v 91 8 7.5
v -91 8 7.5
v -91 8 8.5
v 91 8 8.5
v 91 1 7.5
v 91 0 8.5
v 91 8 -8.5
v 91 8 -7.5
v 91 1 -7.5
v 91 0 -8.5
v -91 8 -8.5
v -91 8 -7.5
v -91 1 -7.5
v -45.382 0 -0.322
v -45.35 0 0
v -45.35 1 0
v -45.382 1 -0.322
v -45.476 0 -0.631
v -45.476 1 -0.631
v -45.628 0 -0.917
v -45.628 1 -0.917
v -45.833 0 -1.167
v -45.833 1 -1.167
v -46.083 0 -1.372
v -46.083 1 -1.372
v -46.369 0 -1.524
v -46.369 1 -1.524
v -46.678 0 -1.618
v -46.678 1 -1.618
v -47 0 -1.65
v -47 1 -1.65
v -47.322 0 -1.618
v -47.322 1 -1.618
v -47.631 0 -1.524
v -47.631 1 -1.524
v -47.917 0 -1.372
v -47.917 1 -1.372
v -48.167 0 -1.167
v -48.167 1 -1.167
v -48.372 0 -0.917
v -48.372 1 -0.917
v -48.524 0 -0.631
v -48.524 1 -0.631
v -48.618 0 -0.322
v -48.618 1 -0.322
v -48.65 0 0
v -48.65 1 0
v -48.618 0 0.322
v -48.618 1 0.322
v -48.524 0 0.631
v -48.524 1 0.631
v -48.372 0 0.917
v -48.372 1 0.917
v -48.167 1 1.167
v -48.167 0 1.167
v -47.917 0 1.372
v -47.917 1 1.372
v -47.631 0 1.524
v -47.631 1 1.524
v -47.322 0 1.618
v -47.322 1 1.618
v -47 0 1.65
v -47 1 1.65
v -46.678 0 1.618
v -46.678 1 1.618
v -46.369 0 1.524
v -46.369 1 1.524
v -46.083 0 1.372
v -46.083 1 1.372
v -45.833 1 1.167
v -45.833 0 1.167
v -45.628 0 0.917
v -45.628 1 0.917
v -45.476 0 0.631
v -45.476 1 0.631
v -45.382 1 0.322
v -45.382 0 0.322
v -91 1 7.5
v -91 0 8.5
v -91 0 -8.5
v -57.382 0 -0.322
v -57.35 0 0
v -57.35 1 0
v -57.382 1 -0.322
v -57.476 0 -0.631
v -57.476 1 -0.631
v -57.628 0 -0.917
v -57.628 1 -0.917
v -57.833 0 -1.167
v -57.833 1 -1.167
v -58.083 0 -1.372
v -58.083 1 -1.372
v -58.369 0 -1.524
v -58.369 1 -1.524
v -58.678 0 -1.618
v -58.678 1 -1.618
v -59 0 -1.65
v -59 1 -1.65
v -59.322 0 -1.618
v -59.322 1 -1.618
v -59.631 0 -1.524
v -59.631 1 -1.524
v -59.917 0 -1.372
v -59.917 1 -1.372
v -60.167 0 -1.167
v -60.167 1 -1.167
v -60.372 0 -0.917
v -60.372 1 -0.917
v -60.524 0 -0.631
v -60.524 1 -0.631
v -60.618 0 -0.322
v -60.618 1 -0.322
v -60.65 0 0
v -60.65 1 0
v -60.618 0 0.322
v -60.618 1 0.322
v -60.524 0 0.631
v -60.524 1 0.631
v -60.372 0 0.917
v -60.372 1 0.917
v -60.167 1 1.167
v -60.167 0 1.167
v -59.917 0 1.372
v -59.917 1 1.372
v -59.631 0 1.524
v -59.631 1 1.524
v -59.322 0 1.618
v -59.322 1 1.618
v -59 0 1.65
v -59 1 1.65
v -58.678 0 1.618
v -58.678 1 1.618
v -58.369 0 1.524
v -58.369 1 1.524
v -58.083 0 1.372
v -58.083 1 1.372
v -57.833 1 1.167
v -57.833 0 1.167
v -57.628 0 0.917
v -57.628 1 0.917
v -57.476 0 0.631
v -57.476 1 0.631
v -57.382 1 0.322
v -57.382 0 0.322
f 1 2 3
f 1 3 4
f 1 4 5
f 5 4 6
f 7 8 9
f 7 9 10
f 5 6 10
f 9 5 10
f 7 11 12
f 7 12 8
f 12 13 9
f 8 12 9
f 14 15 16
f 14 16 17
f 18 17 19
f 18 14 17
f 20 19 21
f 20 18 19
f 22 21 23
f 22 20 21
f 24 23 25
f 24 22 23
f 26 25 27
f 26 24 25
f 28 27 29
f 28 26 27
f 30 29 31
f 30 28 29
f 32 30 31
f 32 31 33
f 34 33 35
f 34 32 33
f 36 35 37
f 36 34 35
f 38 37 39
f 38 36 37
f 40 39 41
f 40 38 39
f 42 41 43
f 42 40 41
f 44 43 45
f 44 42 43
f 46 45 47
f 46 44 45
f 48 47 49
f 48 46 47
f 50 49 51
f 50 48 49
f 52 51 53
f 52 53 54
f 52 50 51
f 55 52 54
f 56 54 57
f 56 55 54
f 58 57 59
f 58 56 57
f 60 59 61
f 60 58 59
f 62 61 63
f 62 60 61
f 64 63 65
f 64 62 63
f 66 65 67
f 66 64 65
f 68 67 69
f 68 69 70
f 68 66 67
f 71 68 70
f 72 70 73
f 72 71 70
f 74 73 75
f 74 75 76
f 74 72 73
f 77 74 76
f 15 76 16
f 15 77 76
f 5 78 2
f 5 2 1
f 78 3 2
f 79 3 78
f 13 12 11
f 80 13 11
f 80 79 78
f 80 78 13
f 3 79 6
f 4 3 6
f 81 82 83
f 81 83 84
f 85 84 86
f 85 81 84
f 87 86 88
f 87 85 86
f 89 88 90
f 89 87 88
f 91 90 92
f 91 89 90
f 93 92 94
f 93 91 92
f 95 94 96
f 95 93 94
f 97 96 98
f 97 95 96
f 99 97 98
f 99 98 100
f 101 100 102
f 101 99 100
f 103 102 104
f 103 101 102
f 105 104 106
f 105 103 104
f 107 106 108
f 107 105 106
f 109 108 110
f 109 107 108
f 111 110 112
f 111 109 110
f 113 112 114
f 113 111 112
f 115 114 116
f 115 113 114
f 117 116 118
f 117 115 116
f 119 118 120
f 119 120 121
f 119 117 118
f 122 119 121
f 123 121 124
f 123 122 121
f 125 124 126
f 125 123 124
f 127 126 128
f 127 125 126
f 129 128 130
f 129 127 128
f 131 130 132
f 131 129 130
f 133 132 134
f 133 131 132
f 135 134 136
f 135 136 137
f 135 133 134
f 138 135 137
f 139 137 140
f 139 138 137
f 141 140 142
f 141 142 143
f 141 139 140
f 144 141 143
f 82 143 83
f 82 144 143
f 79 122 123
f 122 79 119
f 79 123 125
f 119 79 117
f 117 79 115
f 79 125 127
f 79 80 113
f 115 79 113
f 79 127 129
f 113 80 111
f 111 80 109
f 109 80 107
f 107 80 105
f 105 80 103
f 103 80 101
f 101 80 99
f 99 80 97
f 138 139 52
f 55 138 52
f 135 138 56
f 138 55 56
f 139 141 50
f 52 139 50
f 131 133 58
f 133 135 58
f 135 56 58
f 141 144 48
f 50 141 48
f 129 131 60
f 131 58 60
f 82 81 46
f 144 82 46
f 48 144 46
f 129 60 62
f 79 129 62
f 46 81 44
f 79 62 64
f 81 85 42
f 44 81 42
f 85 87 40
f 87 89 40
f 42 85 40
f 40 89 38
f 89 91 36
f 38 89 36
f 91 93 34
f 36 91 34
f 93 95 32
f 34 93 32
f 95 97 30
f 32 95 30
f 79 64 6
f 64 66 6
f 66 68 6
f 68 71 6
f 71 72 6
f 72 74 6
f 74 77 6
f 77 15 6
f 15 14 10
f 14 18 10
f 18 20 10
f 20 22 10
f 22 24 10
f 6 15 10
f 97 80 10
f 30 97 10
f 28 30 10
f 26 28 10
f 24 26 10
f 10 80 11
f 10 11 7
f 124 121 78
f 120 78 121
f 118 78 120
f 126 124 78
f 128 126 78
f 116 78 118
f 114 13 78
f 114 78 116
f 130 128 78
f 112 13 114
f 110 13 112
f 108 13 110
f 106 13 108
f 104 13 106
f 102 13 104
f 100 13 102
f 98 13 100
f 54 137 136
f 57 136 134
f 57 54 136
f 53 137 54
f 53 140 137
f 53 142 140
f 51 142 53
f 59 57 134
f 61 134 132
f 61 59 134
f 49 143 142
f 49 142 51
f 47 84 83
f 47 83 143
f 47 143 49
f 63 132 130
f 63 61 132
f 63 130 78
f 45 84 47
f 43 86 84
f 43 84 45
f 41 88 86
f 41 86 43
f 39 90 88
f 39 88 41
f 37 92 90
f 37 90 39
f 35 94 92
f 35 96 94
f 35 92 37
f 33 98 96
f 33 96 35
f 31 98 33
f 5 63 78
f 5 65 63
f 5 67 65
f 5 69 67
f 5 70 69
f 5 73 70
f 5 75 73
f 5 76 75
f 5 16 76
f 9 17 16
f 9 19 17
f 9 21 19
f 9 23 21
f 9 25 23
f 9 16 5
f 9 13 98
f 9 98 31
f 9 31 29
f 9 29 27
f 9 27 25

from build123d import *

# Parameters (mm, degrees)
SKETCH1_W               = 182
SKETCH1_H               = 17
BOSS_EXTRUDE1_DEPTH     = 1
SKETCH8_W               = 182
SKETCH8_H               = 1
BOSS_EXTRUDE2_DEPTH     = 7
ADVANCEDHOLE1_OUTLINE_R = 1.65
ADVANCEDHOLE1_DEPTH     = 1
SKETCH12_W              = 182
SKETCH12_H              = 13
SKETCH12_R              = 2
BOSS_EXTRUDE3_DEPTH     = 1
SKETCH13_W              = 182
SKETCH13_H              = 1
BOSS_EXTRUDE4_DEPTH     = 3


# Read off the part's stored shape, not the designer's step: AdvancedHole1
with BuildPart() as part:
    # Sketch1 → Boss-Extrude1 (new body)
    with BuildSketch(Plane(origin=(0, 0, 0), x_dir=(1, 0, 0), z_dir=(0, 1, 0))):
        Rectangle(SKETCH1_W, SKETCH1_H)
    extrude(amount=BOSS_EXTRUDE1_DEPTH)

    # Sketch8 → Boss-Extrude2 (add)
    with BuildSketch(Plane(origin=(0, 1, 0), x_dir=(1, 0, 0), z_dir=(0, 1, 0))):
        with Locations((0, 8)):
            Rectangle(SKETCH8_W, SKETCH8_H)
        with Locations((0, -8)):
            Rectangle(SKETCH8_W, SKETCH8_H)
    extrude(amount=BOSS_EXTRUDE2_DEPTH)

    # AdvancedHole1 outline → AdvancedHole1 (cut)
    with BuildSketch(Plane(origin=(0, 0, 0), x_dir=(1, 0, 0), z_dir=(0, 1, 0))):
        with Locations((-47, 0)):
            Circle(ADVANCEDHOLE1_OUTLINE_R)
        with Locations((-59, 0)):
            Circle(ADVANCEDHOLE1_OUTLINE_R)
    extrude(amount=ADVANCEDHOLE1_DEPTH, mode=Mode.SUBTRACT)


with BuildPart() as body_2:
    # Sketch12 → Boss-Extrude3 (new body)
    with BuildSketch(Plane(origin=(0, 0, 0), x_dir=(1, 0, 0), z_dir=(0, 1, 0))):
        with Locations((0, 44.153691451)):
            Rectangle(SKETCH12_W, SKETCH12_H)
        with Locations(Location((-72, 44.153691451, 0), (0, 0, 270))):
            Circle(SKETCH12_R, mode=Mode.SUBTRACT)
        with Locations(Location((-64, 44.153691451, 0), (0, 0, 270))):
            Circle(SKETCH12_R, mode=Mode.SUBTRACT)
        with Locations(Location((-56, 44.153691451, 0), (0, 0, 270))):
            Circle(SKETCH12_R, mode=Mode.SUBTRACT)
        with Locations(Location((-40, 44.153691451, 0), (0, 0, 270))):
            Circle(SKETCH12_R, mode=Mode.SUBTRACT)
        with Locations(Location((-32, 44.153691451, 0), (0, 0, 270))):
            Circle(SKETCH12_R, mode=Mode.SUBTRACT)
        with Locations(Location((-24, 44.153691451, 0), (0, 0, 270))):
            Circle(SKETCH12_R, mode=Mode.SUBTRACT)
        with Locations(Location((40, 44.153691451, 0), (0, 0, 90))):
            Circle(SKETCH12_R, mode=Mode.SUBTRACT)
        with Locations(Location((32, 44.153691451, 0), (0, 0, 90))):
            Circle(SKETCH12_R, mode=Mode.SUBTRACT)
        with Locations(Location((24, 44.153691451, 0), (0, 0, 90))):
            Circle(SKETCH12_R, mode=Mode.SUBTRACT)
        with Locations(Location((8, 44.153691451, 0), (0, 0, 90))):
            Circle(SKETCH12_R, mode=Mode.SUBTRACT)
        with Locations(Location((0, 44.153691451, 0), (0, 0, 90))):
            Circle(SKETCH12_R, mode=Mode.SUBTRACT)
        with Locations(Location((-8, 44.153691451, 0), (0, 0, 90))):
            Circle(SKETCH12_R, mode=Mode.SUBTRACT)
        with Locations(Location((72, 44.153691451, 0), (0, 0, 270))):
            Circle(SKETCH12_R, mode=Mode.SUBTRACT)
        with Locations(Location((64, 44.153691451, 0), (0, 0, 270))):
            Circle(SKETCH12_R, mode=Mode.SUBTRACT)
        with Locations(Location((56, 44.153691451, 0), (0, 0, 270))):
            Circle(SKETCH12_R, mode=Mode.SUBTRACT)
    extrude(amount=BOSS_EXTRUDE3_DEPTH)

    # Sketch13 → Boss-Extrude4 (add)
    with BuildSketch(Plane(origin=(0, 1, 0), x_dir=(1, 0, 0), z_dir=(0, 1, 0))):
        with Locations((0, 50.153691451)):
            Rectangle(SKETCH13_W, SKETCH13_H)
        with Locations((0, 38.153691451)):
            Rectangle(SKETCH13_W, SKETCH13_H)
    extrude(amount=BOSS_EXTRUDE4_DEPTH)


solid = part.part
